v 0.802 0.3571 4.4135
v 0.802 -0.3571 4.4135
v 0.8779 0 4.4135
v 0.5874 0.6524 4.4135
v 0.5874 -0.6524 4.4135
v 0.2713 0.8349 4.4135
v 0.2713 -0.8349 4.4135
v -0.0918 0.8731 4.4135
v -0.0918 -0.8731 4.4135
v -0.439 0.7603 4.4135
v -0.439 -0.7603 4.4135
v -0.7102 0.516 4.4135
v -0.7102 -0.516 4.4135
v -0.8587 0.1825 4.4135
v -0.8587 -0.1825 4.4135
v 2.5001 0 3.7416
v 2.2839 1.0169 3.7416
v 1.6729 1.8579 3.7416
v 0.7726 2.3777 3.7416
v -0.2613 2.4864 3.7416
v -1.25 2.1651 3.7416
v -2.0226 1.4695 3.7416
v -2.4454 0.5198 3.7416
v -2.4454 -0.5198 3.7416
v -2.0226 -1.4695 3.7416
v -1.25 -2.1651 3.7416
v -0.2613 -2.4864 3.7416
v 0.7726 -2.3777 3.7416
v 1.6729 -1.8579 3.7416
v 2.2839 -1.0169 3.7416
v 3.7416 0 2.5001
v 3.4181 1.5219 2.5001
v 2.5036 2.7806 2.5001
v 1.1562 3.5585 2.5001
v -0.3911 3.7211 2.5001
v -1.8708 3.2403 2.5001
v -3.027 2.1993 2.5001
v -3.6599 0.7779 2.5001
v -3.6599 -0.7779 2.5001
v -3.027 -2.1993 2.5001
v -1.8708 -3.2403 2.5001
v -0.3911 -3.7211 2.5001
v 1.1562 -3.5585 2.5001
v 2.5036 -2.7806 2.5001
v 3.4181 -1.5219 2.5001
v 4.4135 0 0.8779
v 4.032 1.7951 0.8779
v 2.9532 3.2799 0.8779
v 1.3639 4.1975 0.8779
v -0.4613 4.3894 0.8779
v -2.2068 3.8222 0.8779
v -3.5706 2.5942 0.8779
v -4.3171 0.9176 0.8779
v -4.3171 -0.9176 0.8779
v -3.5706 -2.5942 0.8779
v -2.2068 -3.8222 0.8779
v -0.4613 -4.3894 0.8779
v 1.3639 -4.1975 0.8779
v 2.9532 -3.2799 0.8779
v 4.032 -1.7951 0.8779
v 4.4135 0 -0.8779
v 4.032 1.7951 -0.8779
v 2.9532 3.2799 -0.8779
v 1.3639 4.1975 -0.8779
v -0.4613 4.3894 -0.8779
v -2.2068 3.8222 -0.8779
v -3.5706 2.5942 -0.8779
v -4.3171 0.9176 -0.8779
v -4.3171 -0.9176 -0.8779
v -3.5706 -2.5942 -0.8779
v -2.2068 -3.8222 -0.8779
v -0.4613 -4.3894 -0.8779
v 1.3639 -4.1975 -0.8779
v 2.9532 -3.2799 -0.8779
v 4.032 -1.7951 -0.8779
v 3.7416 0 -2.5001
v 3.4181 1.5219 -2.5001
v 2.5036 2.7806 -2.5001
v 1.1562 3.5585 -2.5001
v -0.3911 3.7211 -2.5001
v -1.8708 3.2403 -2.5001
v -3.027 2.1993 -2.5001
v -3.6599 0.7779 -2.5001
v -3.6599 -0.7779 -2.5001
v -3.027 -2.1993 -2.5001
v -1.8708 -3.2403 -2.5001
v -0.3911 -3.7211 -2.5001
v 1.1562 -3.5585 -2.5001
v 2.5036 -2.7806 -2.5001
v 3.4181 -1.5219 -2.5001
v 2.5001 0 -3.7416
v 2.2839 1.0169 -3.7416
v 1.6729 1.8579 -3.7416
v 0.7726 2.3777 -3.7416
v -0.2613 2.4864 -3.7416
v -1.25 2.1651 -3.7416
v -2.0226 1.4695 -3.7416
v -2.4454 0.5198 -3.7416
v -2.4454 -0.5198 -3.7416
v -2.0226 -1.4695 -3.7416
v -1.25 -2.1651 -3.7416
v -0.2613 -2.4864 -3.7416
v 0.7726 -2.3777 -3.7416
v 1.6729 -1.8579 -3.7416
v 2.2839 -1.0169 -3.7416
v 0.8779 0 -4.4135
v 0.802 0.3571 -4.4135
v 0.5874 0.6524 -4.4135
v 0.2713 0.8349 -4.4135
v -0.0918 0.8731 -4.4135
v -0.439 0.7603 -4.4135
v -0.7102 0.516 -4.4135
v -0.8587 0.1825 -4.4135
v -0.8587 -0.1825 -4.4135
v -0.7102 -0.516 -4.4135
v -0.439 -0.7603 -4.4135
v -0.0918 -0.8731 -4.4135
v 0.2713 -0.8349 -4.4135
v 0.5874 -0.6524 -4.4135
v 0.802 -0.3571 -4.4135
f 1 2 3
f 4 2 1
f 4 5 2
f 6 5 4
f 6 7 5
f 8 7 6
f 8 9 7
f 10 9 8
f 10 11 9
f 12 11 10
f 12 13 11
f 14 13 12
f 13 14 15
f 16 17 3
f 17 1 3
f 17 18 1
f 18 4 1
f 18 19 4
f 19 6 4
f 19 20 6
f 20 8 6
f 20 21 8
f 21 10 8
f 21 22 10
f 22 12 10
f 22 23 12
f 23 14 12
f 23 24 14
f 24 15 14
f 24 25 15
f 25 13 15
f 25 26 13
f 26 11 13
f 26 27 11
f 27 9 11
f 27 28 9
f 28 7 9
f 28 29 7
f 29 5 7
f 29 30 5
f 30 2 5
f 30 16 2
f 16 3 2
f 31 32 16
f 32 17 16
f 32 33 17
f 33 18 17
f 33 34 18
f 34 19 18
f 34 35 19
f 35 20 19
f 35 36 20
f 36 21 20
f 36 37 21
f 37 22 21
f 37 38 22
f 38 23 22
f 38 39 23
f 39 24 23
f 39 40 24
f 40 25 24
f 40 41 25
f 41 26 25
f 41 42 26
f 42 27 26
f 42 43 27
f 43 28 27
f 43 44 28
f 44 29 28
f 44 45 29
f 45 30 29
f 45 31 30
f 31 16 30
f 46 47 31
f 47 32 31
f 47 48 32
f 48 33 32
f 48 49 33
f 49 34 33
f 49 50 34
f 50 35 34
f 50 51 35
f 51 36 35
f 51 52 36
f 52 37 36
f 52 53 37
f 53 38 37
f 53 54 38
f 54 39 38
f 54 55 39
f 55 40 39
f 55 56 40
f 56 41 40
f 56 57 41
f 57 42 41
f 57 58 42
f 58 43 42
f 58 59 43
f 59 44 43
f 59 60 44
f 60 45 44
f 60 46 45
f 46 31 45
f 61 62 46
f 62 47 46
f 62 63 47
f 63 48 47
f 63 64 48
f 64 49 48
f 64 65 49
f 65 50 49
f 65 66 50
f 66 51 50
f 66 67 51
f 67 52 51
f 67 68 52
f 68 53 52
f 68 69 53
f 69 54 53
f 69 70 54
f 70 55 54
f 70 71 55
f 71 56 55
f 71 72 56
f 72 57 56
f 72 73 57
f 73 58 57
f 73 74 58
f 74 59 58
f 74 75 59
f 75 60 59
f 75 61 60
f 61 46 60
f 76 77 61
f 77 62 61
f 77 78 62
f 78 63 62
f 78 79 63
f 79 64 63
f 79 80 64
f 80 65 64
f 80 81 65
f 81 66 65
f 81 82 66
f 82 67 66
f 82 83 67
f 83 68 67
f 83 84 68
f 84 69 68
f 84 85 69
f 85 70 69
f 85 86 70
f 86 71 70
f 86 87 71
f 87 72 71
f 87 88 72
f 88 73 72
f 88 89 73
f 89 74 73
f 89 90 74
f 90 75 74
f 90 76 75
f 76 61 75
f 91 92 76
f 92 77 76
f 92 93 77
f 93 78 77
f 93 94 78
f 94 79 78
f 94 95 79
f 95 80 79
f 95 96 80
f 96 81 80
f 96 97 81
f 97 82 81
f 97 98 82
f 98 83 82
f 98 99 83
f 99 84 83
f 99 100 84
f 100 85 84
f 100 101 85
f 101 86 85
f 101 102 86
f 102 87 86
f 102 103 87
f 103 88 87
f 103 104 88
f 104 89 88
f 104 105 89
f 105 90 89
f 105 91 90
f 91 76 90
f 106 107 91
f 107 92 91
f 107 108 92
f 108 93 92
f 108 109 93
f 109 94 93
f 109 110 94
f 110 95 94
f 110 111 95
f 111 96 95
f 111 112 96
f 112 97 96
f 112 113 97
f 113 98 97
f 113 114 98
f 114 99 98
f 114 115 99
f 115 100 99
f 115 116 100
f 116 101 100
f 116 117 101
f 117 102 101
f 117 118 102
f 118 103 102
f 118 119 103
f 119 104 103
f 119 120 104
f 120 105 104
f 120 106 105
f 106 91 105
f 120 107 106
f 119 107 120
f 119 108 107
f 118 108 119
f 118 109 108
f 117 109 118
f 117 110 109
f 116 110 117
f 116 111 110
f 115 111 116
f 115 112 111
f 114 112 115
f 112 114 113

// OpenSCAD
// Generated by SolidPython 1.0.1 on 2020-07-29 00:02:42


sphere(d = 9, r = 7);
/***********************************************
*********      SolidPython code:      **********
************************************************
 
# import packages: SolidPython
from solid import *
from solid.utils import *
from itertools import chain, combinations


class Resize:

    def __init__(self, scad_file):
        self.scad_file = scad_file
        #self.scad_file = import_scad(scad_file)
        # cone/cylinder param:
        self.r1 = 0
        self.r2 = 0
        self.h = 0
        # rectangular prism param:
        self.w = 0
        self.l = 0
        # ellipse param:
        self.r = 0

    # import OpenScad code (file name corresponds to shape)


    # classify shape + parameters
    def assign(self, param1, param2, param3):
        if self.scad_file == 'cone.scad':
            self.r1 = param1
            self.r2 = param2
            self.h = param3
        elif self.scad_file == 'cylinder.scad':
            self.r1 = param1
            self.r2 = param2
            self.h = param3
        elif self.scad_file == 'rectangularPrism.scad':
            self.h = param1
            self.l = param2
            self.w = param3
        else:
            self.r = param1
            self.h = param2

    # resize parameters
    def iterate(self):
        x = range(3, 20, 2)
        i = 1
        if self.scad_file == 'cone.scad':
            tempList = list(combinations(x, 3))
            #print(tempList)
            for i in x:
                for j in range (3):
                    param1 = tempList[i][0]
                    param2 = tempList[i][1]
                    param3 = tempList[i][2]
                    filepath = 'produced_scad_files/' + 'cone' + str(param1) + '_' + str(param2) + '_' + str(param3) + '.scad'
                    scad_render_to_file(cylinder(h=param1, r1=param2, r2=param3), filepath)

        elif self.scad_file == 'cylinder.scad':
            tempList = list(combinations(x, 3))
            for i in x:
                for j in range(3):
                    param1 = tempList[i][0]
                    param2 = tempList[i][1]
                    param3 = tempList[i][2]
                    filepath = 'produced_scad_files/' + 'cylinder' + str(param1) + '_' + str(param2) + '_' + str(param3) + '.scad'
                    scad_render_to_file(cylinder(h=param1, r1=param2, r2=param3), filepath)

        elif self.scad_file == 'rectangularPrism.scad':
            tempList = list(combinations(x, 3))
            for i in x:
                for j in range(3):
                    param1 = tempList[i][0]
                    param2 = tempList[i][1]
                    param3 = tempList[i][2]
                    filepath = 'produced_scad_files/' + 'rectangularPrism' + str(param1) + '_' + str(param2) + '_' + str(
                        param3) + '.scad'
                    scad_render_to_file(cube(size=(param1, param2, param3)), filepath)

        else:
            tempList = list(combinations(x, 2))
            for i in x:
                for j in range(3):
                    param1 = tempList[i][0]
                    param2 = tempList[i][1]
                    filepath = 'produced_scad_files/' + 'ellipse' + str(param1) + '_' + str(param2) + '_' + '.scad'
                    scad_render_to_file(sphere(param1, param2), filepath)

    def render_to_scadfile(self):
        scad_render_to_file(scad, 'example.scad') 
 
************************************************/
